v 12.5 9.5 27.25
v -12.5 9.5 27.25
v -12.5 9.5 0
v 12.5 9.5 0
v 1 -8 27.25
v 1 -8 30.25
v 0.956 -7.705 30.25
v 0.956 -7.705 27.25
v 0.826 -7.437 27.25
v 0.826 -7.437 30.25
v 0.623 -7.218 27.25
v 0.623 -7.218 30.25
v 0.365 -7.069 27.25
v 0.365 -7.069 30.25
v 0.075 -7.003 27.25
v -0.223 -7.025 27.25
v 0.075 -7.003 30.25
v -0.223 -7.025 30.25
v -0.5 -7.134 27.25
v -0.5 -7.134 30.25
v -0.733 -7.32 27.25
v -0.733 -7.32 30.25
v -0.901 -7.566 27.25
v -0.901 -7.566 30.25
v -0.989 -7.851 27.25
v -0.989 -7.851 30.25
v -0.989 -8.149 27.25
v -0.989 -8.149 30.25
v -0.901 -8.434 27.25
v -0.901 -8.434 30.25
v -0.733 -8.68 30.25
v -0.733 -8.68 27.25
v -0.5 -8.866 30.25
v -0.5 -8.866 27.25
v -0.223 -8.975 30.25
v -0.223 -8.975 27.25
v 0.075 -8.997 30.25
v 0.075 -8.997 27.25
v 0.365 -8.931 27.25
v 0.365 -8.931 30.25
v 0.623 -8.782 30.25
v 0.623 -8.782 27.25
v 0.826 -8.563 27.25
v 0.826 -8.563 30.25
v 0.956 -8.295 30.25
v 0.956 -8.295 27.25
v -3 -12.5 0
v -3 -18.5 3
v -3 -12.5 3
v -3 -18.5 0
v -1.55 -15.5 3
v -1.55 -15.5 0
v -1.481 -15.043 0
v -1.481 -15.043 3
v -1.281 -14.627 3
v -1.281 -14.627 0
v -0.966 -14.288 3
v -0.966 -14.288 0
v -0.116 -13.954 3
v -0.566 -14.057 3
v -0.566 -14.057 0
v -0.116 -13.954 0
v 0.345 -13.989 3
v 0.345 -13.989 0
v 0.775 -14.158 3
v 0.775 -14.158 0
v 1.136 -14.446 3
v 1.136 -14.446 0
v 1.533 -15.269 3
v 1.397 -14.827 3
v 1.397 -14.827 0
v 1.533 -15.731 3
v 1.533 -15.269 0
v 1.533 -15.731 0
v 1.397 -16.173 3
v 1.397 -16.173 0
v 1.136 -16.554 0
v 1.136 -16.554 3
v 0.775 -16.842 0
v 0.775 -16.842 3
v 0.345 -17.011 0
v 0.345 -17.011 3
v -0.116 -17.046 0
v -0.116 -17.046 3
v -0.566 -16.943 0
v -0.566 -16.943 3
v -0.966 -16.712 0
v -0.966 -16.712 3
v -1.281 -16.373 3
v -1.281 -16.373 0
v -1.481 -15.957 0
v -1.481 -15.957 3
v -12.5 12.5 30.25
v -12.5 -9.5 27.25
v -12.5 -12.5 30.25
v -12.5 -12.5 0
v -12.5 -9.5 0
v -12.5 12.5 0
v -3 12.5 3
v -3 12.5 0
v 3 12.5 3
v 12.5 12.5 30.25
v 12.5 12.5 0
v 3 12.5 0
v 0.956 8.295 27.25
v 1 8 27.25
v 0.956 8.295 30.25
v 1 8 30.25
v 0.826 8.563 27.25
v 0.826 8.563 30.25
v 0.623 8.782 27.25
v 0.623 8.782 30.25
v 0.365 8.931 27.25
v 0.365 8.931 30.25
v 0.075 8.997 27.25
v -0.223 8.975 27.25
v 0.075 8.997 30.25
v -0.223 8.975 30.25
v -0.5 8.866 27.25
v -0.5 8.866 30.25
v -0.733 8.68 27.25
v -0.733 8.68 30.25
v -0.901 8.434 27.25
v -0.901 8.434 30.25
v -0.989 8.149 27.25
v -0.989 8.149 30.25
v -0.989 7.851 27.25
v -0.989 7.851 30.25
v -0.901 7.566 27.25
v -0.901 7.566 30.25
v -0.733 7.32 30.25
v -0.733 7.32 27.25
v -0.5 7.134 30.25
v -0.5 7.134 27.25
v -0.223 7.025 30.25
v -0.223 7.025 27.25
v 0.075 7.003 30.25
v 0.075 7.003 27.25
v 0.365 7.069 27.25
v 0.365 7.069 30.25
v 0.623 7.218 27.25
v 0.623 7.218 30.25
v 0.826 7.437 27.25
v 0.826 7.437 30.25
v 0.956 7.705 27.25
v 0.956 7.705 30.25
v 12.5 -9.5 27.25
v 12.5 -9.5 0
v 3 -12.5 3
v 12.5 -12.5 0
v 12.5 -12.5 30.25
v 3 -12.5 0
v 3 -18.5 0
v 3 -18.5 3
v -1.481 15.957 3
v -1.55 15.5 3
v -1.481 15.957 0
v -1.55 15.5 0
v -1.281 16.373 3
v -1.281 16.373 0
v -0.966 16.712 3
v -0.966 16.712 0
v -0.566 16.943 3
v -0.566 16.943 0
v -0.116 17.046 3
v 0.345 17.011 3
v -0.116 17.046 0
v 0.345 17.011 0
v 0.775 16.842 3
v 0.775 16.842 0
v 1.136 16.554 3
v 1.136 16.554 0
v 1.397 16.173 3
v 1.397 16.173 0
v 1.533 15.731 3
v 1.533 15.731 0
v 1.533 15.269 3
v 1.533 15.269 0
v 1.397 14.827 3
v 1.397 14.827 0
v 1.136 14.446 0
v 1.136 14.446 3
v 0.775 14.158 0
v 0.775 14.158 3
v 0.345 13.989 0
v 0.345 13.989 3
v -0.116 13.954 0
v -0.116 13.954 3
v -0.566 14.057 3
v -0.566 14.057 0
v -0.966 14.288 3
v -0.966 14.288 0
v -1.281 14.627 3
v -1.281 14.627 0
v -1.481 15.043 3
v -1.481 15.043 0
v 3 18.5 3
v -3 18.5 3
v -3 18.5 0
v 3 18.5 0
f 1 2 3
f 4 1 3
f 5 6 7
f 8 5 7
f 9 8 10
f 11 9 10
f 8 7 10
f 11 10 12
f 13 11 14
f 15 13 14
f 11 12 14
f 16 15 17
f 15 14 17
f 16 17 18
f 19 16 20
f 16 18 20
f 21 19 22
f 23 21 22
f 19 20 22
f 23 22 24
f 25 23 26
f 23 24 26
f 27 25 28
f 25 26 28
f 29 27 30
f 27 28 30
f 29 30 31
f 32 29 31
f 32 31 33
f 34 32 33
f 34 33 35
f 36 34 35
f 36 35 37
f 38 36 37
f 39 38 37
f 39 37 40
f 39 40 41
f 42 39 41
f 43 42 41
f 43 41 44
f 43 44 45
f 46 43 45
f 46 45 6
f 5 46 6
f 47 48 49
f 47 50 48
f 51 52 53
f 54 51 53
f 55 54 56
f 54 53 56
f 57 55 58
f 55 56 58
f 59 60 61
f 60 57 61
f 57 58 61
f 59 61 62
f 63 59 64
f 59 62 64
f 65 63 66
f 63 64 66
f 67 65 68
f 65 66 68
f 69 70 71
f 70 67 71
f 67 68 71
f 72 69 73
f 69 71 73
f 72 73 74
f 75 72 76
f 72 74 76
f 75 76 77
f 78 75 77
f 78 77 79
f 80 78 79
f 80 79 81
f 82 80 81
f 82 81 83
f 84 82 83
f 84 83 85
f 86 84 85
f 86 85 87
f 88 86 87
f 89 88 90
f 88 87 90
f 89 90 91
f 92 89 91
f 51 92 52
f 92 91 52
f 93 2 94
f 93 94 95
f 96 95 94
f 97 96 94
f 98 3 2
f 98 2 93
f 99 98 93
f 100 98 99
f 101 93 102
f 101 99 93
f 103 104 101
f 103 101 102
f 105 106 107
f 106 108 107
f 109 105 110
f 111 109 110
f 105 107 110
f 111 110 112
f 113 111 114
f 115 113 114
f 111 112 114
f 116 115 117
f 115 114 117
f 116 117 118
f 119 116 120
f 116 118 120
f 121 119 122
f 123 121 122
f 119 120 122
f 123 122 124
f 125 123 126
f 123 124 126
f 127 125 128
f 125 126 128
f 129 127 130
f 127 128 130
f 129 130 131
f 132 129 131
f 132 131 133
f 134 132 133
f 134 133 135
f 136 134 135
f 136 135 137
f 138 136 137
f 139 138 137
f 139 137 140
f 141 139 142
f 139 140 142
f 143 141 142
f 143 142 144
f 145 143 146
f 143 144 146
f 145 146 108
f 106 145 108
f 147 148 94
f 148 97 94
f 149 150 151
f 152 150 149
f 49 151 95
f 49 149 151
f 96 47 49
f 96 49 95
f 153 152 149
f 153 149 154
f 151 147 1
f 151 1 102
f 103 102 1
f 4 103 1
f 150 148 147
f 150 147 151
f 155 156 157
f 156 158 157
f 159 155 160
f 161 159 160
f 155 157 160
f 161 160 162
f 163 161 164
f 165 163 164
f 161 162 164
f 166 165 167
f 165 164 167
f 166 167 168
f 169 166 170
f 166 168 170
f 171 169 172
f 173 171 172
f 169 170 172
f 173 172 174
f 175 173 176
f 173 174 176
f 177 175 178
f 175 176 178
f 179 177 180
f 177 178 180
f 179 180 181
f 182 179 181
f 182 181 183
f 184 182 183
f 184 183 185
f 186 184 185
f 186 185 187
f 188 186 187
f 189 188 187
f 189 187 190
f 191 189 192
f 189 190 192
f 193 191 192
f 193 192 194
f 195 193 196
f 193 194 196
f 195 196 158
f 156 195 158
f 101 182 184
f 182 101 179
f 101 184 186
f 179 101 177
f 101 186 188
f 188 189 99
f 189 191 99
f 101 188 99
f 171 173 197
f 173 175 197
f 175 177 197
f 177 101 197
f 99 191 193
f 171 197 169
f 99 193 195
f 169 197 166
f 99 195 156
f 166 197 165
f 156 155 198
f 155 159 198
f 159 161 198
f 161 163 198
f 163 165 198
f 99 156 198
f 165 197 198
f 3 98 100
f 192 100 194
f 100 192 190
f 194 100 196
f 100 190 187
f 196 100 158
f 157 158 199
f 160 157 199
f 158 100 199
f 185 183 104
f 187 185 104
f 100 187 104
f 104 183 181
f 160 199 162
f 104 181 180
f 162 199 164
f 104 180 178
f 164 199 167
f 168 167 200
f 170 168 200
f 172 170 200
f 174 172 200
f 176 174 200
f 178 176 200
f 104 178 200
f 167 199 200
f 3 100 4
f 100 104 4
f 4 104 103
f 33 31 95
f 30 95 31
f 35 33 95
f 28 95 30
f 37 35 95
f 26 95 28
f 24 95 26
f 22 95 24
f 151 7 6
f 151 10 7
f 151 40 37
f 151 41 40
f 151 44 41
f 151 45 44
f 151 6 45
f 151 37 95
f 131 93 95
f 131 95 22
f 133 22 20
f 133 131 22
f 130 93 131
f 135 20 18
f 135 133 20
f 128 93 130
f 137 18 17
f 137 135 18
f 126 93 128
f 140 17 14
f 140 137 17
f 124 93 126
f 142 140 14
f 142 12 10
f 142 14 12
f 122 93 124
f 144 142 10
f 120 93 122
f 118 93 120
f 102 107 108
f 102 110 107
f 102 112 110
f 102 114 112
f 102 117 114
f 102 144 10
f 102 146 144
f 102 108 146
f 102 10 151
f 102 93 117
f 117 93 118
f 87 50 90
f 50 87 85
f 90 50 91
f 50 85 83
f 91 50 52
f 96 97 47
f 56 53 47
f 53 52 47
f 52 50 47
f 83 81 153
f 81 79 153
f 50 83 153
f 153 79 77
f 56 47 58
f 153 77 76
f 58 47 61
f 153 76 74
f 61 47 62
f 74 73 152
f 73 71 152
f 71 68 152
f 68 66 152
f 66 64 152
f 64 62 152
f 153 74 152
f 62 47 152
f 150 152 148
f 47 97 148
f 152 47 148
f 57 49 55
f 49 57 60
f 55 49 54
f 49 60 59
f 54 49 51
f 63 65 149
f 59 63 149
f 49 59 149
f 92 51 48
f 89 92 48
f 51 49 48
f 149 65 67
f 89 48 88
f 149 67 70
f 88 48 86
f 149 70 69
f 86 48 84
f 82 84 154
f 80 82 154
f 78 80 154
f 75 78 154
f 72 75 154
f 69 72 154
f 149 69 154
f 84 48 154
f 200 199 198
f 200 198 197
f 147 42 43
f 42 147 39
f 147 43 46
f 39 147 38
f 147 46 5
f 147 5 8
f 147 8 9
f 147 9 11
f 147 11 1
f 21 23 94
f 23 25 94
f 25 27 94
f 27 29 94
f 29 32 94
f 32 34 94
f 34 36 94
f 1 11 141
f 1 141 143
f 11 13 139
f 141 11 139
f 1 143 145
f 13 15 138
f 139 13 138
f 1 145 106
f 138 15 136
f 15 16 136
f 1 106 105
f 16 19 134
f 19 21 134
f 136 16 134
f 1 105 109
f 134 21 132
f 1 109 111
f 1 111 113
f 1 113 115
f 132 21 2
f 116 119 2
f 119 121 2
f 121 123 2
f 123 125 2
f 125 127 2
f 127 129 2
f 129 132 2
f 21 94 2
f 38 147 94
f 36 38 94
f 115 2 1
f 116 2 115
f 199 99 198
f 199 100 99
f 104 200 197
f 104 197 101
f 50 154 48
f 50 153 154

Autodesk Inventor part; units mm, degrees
ref_plane "YZ Plane" through (0, 0, 0) normal (1, 0, 0) x (0, 1, 0)
ref_plane "XZ Plane" through (0, 0, 0) normal (0, 1, 0) x (-1, 0, 0)
ref_plane "XY Plane" through (0, 0, 0) normal (0, 0, 1) x (1, 0, 0)
sketch "Sketch1" plane through (0, 0, 0) normal (0, 0, 1) x (1, 0, 0)
  line L0 (-12.5, 12.5) -> (12.5, 12.5)
  line L1 (12.5, 12.5) -> (12.5, -12.5)
  line L2 (12.5, -12.5) -> (-12.5, -12.5)
  line L3 (-12.5, -12.5) -> (-12.5, 12.5)
  line L4 (-12.5, 12.5) -> (12.5, -12.5) construction
  line L5 (12.5, 12.5) -> (-12.5, -12.5) construction
  point P0 (0, 0)
  dimension "d0" = 25
  dimension "d1" = 25
extrude "Extrusion1" add sketch "Sketch1" along normal blind 30.25
sketch "Sketch3" plane through (-12.5, -12.5, 0) normal (-1, 0, 0) x (0, 0, 1)
  line L0 (0, 25) -> (0, 0) projected
  line L1 (0, 25) -> (30.25, 25) projected
  line L2 (30.25, 0) -> (30.25, 25) projected
  line L3 (0, 0) -> (30.25, 0) projected
  line L4 (27.25, 3) -> (27.25, 22)
  line L5 (27.25, 22) -> (3, 22)
  line L6 (3, 3) -> (27.25, 3)
  line L7 (3, 3) -> (0, 3)
  line L8 (3, 22) -> (0, 22)
  line L9 (0, 3) -> (0, 22)
  line L10 (0, 0) -> (0, 25) projected
  point P0 (0, 12.5)
  dimension "d16" = 3
sketch "Sketch4" plane through (0, 0, 0) normal (0, 0, -1) x (-1, 0, 0)
  line L0 (3, 18.5) -> (-3, 18.5)
  line L1 (-3, 18.5) -> (-3, 12.5)
  line L2 (-3, 12.5) -> (3, 12.5)
  line L3 (3, 12.5) -> (3, 18.5)
  line L4 (3, 18.5) -> (-3, 12.5) construction
  line L5 (-3, 18.5) -> (3, 12.5) construction
  point P0 (0, 0)
  point P1 (0, 19)
  point P2 (0, 15.5)
  dimension "d19" = 6
  dimension "d20" = 6
extrude "Extrusion3" add sketch "Sketch4" against normal blind 3
mirror "Mirror1" about plane through (0, 0, 0) normal (0, 1, 0) of "Extrusion3"
extrude "Extrusion4" cut sketch "Sketch3" against normal up to next contours L8 L5 L4 L6 L7 L0
sketch "Sketch5" plane through (0, 0, 0) normal (0, 0, -1) x (-1, 0, 0)
  circle A0 centre (0, 15.5) radius 1.55
  point P0 (0, 0)
  dimension "d21" = 3.1
extrude "Extrusion5" cut sketch "Sketch5" against normal up to next
mirror "Mirror2" about plane through (0, 0, 0) normal (0, 1, 0) of "Extrusion5"
sketch "Sketch6" plane through (0, 0, 30.25) normal (0, 0, 1) x (1, 0, 0)
  circle A0 centre (0, -8) radius 1
  circle A1 centre (0, 8) radius 1
  point P0 (0, 0)
  dimension "d24" = 2
  dimension "d25" = 2
extrude "Extrusion6" cut sketch "Sketch6" against normal up to next
properties part number "架子 assembly"
